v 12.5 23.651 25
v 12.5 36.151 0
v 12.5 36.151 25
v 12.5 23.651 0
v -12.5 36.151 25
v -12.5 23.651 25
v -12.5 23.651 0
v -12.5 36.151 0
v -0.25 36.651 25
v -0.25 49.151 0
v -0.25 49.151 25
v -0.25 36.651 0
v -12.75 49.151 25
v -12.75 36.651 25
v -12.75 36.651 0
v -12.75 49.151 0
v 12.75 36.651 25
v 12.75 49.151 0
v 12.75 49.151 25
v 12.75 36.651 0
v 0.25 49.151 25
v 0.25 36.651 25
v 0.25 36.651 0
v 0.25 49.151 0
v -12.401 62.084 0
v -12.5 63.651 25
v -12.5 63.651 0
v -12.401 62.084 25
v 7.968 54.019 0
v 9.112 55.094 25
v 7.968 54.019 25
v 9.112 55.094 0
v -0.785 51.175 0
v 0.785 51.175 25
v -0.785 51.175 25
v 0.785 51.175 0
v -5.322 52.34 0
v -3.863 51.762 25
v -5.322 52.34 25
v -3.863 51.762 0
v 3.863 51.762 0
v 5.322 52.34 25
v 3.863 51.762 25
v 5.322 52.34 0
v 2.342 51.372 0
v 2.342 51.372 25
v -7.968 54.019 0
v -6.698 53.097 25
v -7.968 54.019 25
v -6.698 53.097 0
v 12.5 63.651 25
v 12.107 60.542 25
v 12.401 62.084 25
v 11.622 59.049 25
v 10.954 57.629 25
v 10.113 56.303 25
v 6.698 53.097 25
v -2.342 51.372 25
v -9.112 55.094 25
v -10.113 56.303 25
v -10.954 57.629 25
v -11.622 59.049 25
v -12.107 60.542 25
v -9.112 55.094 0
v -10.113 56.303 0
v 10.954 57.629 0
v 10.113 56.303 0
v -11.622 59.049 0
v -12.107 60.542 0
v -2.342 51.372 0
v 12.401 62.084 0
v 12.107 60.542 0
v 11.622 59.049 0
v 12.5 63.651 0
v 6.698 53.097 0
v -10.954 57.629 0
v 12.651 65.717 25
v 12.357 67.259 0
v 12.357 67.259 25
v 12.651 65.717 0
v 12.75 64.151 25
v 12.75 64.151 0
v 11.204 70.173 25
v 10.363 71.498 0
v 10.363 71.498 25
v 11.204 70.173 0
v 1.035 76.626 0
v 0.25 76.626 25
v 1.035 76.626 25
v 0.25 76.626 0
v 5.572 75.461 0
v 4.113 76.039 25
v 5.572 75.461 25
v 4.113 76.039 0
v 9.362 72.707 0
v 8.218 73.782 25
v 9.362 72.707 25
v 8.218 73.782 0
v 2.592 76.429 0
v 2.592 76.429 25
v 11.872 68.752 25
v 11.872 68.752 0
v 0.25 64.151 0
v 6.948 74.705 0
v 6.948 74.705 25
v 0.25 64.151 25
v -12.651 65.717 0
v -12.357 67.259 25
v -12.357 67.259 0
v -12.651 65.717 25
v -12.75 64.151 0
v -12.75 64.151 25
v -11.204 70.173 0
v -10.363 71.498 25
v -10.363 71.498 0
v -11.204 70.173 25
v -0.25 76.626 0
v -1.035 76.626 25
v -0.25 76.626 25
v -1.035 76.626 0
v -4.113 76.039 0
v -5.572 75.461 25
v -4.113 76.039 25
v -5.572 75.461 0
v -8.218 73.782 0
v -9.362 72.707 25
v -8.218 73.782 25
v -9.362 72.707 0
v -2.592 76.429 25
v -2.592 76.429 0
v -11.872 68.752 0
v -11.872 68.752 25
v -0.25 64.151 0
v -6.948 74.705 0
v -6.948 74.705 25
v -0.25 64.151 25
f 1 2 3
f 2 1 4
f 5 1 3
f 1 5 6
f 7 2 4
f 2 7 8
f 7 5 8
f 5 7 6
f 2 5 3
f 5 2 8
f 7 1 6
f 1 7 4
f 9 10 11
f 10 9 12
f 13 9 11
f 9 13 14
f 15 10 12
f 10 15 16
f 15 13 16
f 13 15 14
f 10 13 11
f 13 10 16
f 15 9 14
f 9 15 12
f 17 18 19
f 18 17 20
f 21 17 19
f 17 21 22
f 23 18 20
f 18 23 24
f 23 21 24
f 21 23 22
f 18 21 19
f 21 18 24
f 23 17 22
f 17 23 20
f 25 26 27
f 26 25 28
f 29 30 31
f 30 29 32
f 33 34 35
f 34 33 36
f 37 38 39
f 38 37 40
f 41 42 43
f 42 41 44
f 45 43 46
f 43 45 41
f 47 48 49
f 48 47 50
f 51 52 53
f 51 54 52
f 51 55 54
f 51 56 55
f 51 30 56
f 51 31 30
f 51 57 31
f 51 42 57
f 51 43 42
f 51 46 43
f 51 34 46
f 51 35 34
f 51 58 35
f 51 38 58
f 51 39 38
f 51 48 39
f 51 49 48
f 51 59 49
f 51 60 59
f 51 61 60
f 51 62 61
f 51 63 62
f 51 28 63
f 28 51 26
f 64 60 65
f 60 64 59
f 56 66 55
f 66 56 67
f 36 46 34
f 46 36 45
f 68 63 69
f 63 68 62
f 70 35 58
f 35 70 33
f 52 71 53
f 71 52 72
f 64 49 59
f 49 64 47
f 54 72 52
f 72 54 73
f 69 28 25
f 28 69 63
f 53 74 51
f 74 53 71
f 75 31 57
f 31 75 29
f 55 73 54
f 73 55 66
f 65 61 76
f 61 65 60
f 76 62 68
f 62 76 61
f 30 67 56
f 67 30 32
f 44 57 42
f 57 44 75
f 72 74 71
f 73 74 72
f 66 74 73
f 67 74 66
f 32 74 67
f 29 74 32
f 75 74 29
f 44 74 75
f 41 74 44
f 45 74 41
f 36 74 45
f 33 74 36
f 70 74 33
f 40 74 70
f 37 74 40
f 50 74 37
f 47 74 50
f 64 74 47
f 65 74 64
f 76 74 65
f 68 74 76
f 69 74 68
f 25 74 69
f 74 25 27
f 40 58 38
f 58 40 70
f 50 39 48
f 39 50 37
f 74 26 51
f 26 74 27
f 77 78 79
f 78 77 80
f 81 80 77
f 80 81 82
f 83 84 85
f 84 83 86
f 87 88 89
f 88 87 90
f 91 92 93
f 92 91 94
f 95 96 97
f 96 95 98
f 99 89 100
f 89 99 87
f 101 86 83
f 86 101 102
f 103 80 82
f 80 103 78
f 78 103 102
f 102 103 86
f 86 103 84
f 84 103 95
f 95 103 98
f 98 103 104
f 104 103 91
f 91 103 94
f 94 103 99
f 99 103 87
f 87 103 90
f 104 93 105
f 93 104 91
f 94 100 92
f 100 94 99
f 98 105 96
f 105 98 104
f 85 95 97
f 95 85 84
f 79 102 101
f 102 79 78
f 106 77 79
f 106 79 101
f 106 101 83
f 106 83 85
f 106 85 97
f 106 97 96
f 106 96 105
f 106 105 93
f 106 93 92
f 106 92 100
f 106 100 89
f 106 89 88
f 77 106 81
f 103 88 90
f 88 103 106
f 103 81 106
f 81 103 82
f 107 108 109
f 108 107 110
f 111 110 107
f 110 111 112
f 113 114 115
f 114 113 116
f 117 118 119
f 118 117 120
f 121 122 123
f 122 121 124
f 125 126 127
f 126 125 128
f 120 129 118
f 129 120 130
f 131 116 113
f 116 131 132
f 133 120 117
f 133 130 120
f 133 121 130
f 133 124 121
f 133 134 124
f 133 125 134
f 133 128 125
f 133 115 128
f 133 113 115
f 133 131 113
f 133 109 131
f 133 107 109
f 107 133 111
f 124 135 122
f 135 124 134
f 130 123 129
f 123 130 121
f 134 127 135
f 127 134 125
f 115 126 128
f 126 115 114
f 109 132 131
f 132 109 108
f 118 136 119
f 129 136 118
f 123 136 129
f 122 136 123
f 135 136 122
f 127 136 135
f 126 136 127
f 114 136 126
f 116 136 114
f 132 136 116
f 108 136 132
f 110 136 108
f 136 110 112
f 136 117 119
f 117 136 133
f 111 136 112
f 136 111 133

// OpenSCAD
// DAS BASIC SPIEL - SINA Spielzeug 
// http://www.shop.sina-spielzeug.de/basic-game-p-1446.html
// Code for OpenSCAD: Jorge Medal (@oblomobka) 2015.04 - v.00
// GPL license

// Parts
module dreieck_DBS (side=25){
    POINTS=[    [0,0,0],
                [side/2,0,0],
                [0,side*tan (60)/2,0],
                [0,0,side],
                [side/2,0,side],
                [0,side*tan (60)/2,side]];
    
    FACES=[     [0,1,3],
                [1,4,3],
                [3,4,5],
                [5,2,0],
                [0,3,5],
                [1,4,5],
                [5,2,1],
                [0,2,1]];
    
    polyhedron( points=POINTS,
                faces=FACES
                );
}

module grosses_quadrat_DBS (side=25){
    cube ([side,side/2,side]);
}

module kleines_quadrat_DBS (side=25){
    cube ([side/2,side/2,side]);
}

module halb_kreis_DBS (d=25){
    $fn=50;
    
    difference(){
        cylinder(r=d/2,h=d);
        translate([0,d,d/2])
            cube([2*d,2*d,2*d],center=true);
    }      
}

module viertel_kreis_DBS (d=25){
    $fn=50;
    
    intersection(){
        cylinder(r=d/2,h=d);
        translate([d,d,d/2])
            cube([2*d,2*d,2*d],center=true);
    }
}



// Set
module dasBasicSpiel (dimension=25){

gap1=2;         // gap between parts
gap2=0.5;       // gap between subparts
    
// triangles
color("olive")
    translate([gap2/2,0,0])
        dreieck_DBS(side=dimension);
color("olive")    
    translate([-gap2/2,0,0])
        mirror(0,0,0)
            dreieck_DBS(side=dimension);
    
// quadrats
color("darkred")
    translate([0,dimension*tan(60)/2+gap1,0]){
        translate([-dimension/2,0,0])
            grosses_quadrat_DBS (side=dimension);
        translate([-dimension/2-gap2/2,dimension/2+gap2,0])
            kleines_quadrat_DBS (side=dimension);
        translate([gap2/2,dimension/2+gap2,0])
            kleines_quadrat_DBS (side=dimension);
    }
    
// kreis
color("darkblue")
    translate([0,dimension*tan(60)/2+3*dimension/2+gap2+2*gap1,0]){
        translate([0,0,0])
            halb_kreis_DBS (d=dimension);
        translate([gap2/2,gap2,0])
            viertel_kreis_DBS (d=dimension);
        translate([-gap2/2,gap2,0])
            mirror(0,0,0)
            viertel_kreis_DBS (d=dimension);
    }
}



// Sample
dasBasicSpiel(dimension=25);
